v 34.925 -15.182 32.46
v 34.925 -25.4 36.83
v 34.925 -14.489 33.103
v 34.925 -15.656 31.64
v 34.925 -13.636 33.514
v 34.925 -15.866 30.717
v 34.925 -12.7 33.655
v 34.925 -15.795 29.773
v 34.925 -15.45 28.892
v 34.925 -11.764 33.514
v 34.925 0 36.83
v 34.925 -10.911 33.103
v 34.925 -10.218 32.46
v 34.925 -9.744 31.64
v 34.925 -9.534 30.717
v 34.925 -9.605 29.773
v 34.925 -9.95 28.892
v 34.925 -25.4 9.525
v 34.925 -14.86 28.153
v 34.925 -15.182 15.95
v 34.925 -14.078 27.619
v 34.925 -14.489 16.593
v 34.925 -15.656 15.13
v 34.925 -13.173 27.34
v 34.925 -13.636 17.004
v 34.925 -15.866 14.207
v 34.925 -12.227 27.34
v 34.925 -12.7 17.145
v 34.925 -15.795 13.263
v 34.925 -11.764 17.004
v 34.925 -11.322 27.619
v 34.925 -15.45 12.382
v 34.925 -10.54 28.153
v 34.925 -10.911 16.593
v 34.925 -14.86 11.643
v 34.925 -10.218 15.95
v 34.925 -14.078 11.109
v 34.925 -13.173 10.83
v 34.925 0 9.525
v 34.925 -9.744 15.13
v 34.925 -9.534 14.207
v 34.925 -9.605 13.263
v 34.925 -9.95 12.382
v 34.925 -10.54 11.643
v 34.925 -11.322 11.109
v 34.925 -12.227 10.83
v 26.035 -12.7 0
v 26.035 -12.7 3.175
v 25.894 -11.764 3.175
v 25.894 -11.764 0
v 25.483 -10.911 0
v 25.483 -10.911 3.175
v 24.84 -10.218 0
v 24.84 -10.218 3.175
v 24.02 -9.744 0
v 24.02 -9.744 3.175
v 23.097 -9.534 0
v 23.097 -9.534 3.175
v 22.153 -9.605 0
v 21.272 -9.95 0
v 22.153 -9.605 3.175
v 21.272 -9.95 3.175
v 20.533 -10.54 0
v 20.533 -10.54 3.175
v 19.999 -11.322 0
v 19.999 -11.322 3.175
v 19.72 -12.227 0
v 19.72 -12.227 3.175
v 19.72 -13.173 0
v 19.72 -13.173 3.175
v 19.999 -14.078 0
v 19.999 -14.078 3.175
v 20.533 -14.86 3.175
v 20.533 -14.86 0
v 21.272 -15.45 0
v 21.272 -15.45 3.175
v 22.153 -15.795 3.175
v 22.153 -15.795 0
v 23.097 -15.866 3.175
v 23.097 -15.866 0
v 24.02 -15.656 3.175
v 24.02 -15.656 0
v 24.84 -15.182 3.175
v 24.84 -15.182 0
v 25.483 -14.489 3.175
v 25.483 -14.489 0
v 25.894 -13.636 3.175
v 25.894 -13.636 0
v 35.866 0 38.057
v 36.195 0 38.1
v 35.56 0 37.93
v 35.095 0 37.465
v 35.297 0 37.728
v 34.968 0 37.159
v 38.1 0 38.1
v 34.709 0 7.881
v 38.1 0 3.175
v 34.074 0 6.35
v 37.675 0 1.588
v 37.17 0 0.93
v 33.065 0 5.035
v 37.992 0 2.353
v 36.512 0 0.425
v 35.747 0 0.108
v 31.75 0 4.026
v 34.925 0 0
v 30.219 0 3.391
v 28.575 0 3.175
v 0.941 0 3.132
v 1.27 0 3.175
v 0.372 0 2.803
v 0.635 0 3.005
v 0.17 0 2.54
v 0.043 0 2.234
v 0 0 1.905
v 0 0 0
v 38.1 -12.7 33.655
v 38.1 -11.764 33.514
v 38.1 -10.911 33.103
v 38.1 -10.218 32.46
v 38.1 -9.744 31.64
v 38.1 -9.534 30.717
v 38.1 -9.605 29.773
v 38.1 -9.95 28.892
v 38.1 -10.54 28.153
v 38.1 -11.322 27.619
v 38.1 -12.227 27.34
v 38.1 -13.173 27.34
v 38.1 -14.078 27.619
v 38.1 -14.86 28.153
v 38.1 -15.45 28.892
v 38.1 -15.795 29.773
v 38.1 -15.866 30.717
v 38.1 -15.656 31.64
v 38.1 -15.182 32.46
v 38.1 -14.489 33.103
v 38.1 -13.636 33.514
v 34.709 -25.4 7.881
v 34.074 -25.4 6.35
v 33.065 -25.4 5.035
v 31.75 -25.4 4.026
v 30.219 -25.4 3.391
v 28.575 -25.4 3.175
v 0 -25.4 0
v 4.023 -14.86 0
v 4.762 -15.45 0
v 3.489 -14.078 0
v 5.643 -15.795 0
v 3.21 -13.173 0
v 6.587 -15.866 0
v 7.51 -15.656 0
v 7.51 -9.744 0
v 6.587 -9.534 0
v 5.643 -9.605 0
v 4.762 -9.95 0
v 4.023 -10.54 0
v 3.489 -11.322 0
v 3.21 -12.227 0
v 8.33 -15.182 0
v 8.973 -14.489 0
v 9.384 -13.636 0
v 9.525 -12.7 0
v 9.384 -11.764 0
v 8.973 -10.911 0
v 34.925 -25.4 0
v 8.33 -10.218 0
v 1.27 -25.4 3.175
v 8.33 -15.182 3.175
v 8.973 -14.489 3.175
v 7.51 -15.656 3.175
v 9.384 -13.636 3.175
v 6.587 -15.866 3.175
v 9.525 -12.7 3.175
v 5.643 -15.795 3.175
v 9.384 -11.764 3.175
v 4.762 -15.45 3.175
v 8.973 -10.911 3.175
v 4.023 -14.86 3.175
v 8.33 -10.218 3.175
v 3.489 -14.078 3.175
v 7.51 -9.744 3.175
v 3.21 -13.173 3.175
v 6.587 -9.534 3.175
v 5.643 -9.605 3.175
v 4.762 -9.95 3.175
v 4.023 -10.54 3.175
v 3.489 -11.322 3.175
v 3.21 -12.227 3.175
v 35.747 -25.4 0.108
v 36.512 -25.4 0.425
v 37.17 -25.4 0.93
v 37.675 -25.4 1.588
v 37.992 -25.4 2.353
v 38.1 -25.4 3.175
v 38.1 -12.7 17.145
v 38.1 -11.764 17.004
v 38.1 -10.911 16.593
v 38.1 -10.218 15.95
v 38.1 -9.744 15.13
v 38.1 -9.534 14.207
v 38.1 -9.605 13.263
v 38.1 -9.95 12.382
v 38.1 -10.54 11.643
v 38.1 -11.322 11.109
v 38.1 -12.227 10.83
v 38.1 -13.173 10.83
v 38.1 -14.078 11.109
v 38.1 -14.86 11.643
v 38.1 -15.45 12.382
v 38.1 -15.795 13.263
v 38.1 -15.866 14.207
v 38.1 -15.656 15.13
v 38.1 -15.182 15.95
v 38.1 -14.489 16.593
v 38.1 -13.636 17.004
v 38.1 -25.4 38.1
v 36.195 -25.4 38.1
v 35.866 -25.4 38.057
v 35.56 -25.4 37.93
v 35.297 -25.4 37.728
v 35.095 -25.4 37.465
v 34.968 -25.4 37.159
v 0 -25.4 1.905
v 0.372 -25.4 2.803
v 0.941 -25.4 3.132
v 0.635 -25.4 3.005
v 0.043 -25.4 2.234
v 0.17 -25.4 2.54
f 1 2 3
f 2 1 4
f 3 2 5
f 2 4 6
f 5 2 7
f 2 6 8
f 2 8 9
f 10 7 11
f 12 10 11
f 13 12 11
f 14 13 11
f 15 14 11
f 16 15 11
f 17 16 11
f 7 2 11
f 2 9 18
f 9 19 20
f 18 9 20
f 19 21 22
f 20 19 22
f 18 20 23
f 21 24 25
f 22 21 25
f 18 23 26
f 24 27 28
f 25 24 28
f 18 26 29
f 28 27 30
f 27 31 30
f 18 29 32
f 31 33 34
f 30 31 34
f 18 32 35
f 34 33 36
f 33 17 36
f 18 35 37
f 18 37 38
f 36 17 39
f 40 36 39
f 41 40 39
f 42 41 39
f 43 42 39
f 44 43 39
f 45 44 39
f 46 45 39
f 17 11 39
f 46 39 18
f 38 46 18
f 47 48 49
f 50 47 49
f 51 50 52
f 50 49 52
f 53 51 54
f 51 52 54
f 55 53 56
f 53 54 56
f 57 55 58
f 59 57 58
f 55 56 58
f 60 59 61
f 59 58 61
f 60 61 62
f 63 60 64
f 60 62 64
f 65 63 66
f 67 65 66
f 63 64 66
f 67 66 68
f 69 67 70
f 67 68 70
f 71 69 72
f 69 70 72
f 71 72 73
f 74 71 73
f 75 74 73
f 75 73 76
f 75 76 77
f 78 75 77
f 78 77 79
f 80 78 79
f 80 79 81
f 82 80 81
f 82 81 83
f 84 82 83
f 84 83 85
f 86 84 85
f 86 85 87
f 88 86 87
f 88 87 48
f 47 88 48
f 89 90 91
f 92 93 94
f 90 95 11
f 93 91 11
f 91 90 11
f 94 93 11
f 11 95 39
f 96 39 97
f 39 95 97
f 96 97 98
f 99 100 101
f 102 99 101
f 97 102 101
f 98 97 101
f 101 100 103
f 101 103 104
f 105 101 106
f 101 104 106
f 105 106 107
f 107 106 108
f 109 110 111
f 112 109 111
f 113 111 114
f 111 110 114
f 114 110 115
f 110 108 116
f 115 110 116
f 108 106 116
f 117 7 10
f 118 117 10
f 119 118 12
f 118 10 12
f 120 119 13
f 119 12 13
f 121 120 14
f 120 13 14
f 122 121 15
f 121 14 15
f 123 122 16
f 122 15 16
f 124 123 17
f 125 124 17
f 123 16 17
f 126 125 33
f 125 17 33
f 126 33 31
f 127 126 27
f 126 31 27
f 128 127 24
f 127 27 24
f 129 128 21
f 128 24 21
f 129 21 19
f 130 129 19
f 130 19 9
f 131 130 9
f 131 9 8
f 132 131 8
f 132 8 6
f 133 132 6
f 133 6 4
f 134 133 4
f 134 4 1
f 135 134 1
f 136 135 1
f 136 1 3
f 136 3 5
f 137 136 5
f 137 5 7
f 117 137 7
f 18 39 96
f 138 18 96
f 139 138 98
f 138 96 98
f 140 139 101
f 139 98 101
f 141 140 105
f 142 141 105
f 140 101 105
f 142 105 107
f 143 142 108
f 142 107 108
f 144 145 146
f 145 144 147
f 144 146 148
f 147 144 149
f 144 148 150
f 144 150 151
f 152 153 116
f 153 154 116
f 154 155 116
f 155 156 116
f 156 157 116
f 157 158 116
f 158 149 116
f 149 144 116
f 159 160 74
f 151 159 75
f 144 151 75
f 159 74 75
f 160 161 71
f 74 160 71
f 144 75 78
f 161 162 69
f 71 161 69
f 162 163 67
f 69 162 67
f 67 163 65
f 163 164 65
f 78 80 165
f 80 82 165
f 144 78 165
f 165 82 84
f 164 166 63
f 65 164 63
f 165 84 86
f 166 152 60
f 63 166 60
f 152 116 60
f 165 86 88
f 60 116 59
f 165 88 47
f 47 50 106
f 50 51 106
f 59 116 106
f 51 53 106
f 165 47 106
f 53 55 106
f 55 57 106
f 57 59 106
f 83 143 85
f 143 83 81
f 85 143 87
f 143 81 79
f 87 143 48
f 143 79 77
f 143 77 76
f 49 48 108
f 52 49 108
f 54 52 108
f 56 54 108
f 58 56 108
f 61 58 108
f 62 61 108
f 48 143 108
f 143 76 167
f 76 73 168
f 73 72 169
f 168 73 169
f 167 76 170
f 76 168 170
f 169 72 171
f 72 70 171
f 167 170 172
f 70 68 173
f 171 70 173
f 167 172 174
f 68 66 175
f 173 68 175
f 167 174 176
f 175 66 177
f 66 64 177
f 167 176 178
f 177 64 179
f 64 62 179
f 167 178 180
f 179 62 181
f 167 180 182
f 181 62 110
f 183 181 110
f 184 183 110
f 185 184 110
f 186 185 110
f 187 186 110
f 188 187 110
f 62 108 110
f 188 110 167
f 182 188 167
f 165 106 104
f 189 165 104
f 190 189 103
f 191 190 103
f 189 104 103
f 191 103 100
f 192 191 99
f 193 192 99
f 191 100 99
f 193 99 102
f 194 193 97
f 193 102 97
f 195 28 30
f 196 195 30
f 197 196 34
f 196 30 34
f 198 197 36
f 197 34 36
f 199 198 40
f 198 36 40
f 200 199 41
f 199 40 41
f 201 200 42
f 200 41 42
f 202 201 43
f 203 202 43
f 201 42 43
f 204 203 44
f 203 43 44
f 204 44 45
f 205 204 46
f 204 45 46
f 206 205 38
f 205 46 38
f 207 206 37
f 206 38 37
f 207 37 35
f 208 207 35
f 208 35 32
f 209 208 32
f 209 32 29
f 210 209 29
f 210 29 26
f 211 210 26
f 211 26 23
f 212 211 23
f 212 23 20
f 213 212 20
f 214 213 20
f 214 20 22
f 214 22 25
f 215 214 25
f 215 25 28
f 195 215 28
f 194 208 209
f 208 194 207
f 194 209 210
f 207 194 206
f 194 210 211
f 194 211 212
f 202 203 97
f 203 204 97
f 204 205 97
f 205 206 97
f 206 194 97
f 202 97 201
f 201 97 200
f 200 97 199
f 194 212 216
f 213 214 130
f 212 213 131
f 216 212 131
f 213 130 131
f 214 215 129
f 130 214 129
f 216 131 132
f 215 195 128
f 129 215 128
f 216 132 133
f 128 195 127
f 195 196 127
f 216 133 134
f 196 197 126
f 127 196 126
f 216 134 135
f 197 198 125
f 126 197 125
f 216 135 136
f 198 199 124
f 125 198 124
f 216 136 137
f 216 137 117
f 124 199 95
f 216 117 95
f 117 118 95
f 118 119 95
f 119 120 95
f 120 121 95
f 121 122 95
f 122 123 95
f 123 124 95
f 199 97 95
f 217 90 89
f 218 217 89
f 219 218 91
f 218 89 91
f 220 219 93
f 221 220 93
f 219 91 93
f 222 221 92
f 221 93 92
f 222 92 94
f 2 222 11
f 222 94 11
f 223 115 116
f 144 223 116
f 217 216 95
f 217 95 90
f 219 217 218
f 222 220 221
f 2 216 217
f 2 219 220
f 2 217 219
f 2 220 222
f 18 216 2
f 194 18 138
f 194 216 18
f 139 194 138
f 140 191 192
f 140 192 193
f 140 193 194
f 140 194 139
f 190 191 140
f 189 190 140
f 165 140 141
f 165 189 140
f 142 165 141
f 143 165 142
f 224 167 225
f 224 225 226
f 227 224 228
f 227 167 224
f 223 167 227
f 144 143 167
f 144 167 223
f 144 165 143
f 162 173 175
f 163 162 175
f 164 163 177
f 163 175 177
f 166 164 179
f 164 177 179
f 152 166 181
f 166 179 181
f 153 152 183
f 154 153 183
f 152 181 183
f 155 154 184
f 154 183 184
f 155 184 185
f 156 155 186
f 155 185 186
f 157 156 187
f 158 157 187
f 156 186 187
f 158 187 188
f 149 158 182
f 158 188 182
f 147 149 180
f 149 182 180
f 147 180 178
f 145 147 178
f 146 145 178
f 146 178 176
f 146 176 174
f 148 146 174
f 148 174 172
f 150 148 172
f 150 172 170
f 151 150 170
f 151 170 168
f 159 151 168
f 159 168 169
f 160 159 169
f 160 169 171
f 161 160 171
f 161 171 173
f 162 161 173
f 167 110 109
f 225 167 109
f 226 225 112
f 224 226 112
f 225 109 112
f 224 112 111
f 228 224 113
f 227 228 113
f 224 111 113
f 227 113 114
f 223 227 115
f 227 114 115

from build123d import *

# Parameters (mm, degrees)
BOSS_EXTRUDE1_DEPTH = 25.4
SKETCH2_R           = 3.175
CUT_EXTRUDE1_DEPTH  = 25.4
SKETCH3_R           = 3.175
CUT_EXTRUDE2_DEPTH  = 25.4


with BuildPart() as part:
    # Sketch1 → Boss-Extrude1 (new body)
    with BuildSketch(Plane(origin=(0, 0, 0), x_dir=(1, 0, 0), z_dir=(0, 1, 0))):
        with BuildLine():
            Line((0, 0), (34.925, 0))
            ThreePointArc((34.925, 0), (37.17006403, -0.92993597), (38.1, -3.175))
            Line((38.1, -3.175), (38.1, -38.1))
            Line((38.1, -38.1), (36.195, -38.1))
            ThreePointArc((36.195, -38.1), (35.296974388, -37.728025612), (34.925, -36.83))
            Line((34.925, -36.83), (34.925, -9.525))
            ThreePointArc((34.925, -9.525), (33.065128061, -5.034871939), (28.575, -3.175))
            Line((28.575, -3.175), (1.27, -3.175))
            ThreePointArc((1.27, -3.175), (0.371974388, -2.803025612), (0, -1.905))
            Line((0, -1.905), (0, 0))
        make_face()
    extrude(amount=-BOSS_EXTRUDE1_DEPTH)

    # Sketch2 → Cut-Extrude1 (cut)
    with BuildSketch(Plane.ZY.offset(-34.925)):
        with Locations((30.48, -12.7)):
            Circle(SKETCH2_R)
        with Locations((13.97, -12.7)):
            Circle(SKETCH2_R)
    extrude(amount=-CUT_EXTRUDE1_DEPTH, mode=Mode.SUBTRACT)

    # Sketch3 → Cut-Extrude2 (cut)
    with BuildSketch(Plane.XY.offset(3.175)):
        with Locations((6.35, -12.7)):
            Circle(SKETCH3_R)
        with Locations((22.86, -12.7)):
            Circle(SKETCH3_R)
    extrude(amount=-CUT_EXTRUDE2_DEPTH, mode=Mode.SUBTRACT)


solid = part.part
